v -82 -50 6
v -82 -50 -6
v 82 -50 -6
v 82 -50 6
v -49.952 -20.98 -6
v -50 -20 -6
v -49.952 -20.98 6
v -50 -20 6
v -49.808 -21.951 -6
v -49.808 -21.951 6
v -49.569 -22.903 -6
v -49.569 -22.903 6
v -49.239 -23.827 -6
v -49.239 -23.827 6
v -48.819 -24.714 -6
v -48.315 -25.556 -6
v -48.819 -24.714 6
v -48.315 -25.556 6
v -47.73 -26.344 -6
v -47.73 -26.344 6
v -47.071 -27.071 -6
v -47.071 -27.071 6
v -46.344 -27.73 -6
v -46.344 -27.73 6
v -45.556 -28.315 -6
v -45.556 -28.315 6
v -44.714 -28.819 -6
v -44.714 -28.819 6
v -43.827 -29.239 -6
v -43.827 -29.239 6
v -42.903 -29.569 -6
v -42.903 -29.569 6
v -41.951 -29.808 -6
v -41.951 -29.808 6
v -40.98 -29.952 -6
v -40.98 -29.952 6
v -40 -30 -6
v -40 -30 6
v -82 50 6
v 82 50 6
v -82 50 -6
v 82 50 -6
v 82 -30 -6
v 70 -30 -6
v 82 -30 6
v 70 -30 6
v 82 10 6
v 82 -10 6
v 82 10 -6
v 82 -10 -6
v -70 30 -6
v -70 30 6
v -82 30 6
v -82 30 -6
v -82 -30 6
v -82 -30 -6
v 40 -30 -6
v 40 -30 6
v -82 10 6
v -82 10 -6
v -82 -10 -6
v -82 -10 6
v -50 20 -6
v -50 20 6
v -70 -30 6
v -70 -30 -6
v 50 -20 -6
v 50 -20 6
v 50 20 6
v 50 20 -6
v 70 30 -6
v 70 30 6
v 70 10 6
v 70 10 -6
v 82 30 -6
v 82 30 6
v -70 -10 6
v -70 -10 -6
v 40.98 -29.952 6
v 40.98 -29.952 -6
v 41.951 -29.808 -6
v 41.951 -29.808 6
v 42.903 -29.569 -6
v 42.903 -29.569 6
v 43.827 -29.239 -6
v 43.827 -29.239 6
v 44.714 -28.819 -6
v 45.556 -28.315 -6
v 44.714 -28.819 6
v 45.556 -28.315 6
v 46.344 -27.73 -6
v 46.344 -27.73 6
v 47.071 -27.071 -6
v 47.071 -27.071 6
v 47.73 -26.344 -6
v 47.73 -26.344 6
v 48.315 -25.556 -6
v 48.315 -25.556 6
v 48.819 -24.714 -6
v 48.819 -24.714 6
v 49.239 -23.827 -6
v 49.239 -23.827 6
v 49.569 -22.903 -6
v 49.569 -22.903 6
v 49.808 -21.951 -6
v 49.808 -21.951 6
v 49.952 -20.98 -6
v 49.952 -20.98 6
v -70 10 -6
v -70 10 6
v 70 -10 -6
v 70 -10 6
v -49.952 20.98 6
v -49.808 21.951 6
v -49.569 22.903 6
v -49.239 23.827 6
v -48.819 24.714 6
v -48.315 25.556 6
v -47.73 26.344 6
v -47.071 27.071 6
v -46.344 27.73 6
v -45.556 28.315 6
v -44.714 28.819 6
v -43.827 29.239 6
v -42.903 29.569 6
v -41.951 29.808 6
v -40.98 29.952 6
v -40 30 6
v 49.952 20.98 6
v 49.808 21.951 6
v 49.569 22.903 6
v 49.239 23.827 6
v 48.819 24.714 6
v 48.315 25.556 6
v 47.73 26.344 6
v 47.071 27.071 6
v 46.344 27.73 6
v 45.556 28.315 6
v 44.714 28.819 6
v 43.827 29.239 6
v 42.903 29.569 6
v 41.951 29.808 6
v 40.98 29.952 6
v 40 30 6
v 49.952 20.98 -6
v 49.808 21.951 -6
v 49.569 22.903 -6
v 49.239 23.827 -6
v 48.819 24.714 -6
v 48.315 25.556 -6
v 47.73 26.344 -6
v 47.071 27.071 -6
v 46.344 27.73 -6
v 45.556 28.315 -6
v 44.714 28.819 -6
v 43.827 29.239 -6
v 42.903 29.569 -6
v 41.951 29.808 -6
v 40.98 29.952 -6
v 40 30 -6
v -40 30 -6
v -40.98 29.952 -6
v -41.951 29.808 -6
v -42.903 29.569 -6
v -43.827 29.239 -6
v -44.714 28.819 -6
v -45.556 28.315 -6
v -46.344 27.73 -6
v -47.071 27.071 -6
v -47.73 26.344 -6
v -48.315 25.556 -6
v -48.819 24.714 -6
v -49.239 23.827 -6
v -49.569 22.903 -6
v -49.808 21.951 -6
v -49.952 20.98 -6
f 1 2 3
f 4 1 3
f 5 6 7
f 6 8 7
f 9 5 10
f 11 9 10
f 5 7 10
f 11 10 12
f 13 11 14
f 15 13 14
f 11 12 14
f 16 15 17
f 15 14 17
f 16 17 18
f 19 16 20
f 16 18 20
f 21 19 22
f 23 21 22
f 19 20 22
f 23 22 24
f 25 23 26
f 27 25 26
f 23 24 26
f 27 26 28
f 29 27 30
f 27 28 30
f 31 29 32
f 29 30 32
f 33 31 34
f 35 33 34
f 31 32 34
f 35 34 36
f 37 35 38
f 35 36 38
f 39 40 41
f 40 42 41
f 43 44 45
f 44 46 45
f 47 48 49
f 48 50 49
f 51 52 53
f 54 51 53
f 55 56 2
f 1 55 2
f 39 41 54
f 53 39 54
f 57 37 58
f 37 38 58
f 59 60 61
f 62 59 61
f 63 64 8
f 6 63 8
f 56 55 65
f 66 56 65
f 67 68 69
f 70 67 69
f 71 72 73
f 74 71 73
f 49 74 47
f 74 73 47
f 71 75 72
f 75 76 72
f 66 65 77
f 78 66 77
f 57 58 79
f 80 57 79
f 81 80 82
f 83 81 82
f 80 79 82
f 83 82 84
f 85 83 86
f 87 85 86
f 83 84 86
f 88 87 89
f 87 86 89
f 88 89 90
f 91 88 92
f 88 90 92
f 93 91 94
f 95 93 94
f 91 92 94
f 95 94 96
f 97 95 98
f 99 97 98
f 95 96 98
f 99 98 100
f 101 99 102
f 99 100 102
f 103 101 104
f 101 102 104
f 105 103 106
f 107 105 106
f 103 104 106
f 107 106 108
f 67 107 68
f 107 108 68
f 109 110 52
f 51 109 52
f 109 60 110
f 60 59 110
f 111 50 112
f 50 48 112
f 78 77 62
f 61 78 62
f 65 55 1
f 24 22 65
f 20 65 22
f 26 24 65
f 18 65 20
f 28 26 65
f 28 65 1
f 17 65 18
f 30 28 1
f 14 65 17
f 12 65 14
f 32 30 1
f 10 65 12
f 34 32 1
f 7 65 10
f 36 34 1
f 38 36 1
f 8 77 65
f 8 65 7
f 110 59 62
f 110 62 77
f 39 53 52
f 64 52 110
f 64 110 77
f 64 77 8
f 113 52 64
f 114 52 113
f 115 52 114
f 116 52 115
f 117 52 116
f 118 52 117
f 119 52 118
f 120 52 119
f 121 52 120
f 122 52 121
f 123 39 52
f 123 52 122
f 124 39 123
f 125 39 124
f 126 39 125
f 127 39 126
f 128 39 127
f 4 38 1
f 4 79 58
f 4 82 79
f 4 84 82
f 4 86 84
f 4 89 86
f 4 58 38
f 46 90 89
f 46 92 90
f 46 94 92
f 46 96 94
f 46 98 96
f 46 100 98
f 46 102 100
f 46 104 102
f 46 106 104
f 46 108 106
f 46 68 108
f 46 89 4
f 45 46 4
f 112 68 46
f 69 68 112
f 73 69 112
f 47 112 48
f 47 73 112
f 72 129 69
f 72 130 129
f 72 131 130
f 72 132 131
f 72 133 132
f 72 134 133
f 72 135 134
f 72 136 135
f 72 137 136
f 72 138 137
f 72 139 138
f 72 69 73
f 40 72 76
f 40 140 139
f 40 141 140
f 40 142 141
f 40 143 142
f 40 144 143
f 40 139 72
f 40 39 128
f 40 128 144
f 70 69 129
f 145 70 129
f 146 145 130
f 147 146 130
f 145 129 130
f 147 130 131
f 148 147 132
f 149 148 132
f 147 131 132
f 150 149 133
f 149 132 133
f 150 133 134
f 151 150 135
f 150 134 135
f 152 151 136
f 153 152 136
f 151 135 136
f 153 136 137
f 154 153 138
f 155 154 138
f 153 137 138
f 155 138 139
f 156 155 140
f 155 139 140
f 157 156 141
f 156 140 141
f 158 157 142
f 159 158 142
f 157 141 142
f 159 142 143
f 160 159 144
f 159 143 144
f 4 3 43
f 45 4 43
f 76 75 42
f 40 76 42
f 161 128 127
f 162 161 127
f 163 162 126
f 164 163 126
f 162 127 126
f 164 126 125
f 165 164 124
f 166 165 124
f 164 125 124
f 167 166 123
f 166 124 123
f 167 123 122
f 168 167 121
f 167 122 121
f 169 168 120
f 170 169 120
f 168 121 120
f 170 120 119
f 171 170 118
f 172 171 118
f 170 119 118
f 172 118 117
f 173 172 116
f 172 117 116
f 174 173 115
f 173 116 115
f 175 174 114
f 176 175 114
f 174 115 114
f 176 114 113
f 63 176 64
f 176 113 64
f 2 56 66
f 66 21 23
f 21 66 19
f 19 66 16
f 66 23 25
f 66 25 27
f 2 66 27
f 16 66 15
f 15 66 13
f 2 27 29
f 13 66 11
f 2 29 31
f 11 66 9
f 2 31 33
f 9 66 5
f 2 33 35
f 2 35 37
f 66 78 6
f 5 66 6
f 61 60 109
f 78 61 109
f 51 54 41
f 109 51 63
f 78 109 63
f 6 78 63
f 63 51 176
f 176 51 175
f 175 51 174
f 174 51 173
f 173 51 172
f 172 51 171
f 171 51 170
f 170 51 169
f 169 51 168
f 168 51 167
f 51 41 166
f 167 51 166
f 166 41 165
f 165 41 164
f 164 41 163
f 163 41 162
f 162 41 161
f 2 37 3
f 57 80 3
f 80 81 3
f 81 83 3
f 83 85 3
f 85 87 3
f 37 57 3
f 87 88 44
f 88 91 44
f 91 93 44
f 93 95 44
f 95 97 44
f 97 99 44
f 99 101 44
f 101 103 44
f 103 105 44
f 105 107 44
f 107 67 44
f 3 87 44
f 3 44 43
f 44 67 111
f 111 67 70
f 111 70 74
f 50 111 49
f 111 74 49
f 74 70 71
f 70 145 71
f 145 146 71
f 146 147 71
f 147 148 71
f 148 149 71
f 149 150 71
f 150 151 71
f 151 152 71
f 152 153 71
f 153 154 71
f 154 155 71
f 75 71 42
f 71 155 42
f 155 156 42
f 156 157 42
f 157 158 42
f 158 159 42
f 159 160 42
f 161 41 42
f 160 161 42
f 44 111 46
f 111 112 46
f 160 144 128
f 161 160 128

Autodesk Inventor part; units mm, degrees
ref_plane "YZ Plane" through (0, 0, 0) normal (1, 0, 0) x (0, 1, 0)
ref_plane "XZ Plane" through (0, 0, 0) normal (0, 1, 0) x (-1, 0, 0)
ref_plane "XY Plane" through (0, 0, 0) normal (0, 0, 1) x (1, 0, 0)
sketch "Sketch1" plane through (0, 0, 0) normal (0, 0, 1) x (1, 0, 0)
  line L0 (-82, -50) -> (82, -50)
  line L1 (82, -50) -> (82, 50)
  line L2 (82, 50) -> (-82, 50)
  line L3 (-82, 50) -> (-82, -50)
  line L4 (-82, -50) -> (82, 50) construction
  line L5 (82, -50) -> (-82, 50) construction
  point P0 (0, 0)
  dimension "d0" = 164
  dimension "d1" = 100
extrude "Extrusion1" add sketch "Sketch1" along normal mid plane 12
sketch "Sketch2" plane through (0, 0, 6) normal (0, 0, 1) x (1, 0, 0)
  line L0 (-82, 50) -> (-82, -50) projected
  line L1 (-82, -30) -> (-70, -30)
  line L2 (-70, -30) -> (-70, -10)
  line L3 (-70, -10) -> (-82, -10)
  line L4 (-82, -10) -> (-82, -30)
  line L5 (-82, -50) -> (82, -50) projected
  line L6 (-82, 10) -> (-70, 10)
  line L7 (-70, 10) -> (-70, 30)
  line L8 (-70, 30) -> (-82, 30)
  line L9 (-82, 30) -> (-82, 10)
  point P0 (0, 0)
  dimension "d4" = 12
  dimension "d5" = 20
  dimension "d6" = 20
  dimension "d7" = 20
  dimension "d8" = 20
extrude "Extrusion2" cut sketch "Sketch2" against normal through all
mirror "Mirror1" about plane through (0, 0, 0) normal (1, 0, 0) of "Extrusion2"
sketch "Sketch3" plane through (0, 0, 6) normal (0, 0, 1) x (1, 0, 0)
  line L0 (-40, -30) -> (40, -30)
  line L1 (50, -20) -> (50, 20)
  line L2 (40, 30) -> (-40, 30)
  line L3 (-50, 20) -> (-50, -20)
  line L4 (-50, -30) -> (50, 30) construction
  line L5 (50, -30) -> (-50, 30) construction
  arc A0 (-40, 30) -> (-50, 20) centre (-40, 20) ccw
  arc A1 (50, 20) -> (40, 30) centre (40, 20) ccw
  arc A2 (40, -30) -> (50, -20) centre (40, -20) ccw
  arc A3 (-50, -20) -> (-40, -30) centre (-40, -20) ccw
  point P0 (0, 0)
  dimension "d11" = 100
  dimension "d12" = 60
  dimension "d13" = 10
  dimension "d14" = 10
extrude "Extrusion3" cut sketch "Sketch3" against normal through all
properties part number "FRONT V2" material "Wood (Cherry)"
